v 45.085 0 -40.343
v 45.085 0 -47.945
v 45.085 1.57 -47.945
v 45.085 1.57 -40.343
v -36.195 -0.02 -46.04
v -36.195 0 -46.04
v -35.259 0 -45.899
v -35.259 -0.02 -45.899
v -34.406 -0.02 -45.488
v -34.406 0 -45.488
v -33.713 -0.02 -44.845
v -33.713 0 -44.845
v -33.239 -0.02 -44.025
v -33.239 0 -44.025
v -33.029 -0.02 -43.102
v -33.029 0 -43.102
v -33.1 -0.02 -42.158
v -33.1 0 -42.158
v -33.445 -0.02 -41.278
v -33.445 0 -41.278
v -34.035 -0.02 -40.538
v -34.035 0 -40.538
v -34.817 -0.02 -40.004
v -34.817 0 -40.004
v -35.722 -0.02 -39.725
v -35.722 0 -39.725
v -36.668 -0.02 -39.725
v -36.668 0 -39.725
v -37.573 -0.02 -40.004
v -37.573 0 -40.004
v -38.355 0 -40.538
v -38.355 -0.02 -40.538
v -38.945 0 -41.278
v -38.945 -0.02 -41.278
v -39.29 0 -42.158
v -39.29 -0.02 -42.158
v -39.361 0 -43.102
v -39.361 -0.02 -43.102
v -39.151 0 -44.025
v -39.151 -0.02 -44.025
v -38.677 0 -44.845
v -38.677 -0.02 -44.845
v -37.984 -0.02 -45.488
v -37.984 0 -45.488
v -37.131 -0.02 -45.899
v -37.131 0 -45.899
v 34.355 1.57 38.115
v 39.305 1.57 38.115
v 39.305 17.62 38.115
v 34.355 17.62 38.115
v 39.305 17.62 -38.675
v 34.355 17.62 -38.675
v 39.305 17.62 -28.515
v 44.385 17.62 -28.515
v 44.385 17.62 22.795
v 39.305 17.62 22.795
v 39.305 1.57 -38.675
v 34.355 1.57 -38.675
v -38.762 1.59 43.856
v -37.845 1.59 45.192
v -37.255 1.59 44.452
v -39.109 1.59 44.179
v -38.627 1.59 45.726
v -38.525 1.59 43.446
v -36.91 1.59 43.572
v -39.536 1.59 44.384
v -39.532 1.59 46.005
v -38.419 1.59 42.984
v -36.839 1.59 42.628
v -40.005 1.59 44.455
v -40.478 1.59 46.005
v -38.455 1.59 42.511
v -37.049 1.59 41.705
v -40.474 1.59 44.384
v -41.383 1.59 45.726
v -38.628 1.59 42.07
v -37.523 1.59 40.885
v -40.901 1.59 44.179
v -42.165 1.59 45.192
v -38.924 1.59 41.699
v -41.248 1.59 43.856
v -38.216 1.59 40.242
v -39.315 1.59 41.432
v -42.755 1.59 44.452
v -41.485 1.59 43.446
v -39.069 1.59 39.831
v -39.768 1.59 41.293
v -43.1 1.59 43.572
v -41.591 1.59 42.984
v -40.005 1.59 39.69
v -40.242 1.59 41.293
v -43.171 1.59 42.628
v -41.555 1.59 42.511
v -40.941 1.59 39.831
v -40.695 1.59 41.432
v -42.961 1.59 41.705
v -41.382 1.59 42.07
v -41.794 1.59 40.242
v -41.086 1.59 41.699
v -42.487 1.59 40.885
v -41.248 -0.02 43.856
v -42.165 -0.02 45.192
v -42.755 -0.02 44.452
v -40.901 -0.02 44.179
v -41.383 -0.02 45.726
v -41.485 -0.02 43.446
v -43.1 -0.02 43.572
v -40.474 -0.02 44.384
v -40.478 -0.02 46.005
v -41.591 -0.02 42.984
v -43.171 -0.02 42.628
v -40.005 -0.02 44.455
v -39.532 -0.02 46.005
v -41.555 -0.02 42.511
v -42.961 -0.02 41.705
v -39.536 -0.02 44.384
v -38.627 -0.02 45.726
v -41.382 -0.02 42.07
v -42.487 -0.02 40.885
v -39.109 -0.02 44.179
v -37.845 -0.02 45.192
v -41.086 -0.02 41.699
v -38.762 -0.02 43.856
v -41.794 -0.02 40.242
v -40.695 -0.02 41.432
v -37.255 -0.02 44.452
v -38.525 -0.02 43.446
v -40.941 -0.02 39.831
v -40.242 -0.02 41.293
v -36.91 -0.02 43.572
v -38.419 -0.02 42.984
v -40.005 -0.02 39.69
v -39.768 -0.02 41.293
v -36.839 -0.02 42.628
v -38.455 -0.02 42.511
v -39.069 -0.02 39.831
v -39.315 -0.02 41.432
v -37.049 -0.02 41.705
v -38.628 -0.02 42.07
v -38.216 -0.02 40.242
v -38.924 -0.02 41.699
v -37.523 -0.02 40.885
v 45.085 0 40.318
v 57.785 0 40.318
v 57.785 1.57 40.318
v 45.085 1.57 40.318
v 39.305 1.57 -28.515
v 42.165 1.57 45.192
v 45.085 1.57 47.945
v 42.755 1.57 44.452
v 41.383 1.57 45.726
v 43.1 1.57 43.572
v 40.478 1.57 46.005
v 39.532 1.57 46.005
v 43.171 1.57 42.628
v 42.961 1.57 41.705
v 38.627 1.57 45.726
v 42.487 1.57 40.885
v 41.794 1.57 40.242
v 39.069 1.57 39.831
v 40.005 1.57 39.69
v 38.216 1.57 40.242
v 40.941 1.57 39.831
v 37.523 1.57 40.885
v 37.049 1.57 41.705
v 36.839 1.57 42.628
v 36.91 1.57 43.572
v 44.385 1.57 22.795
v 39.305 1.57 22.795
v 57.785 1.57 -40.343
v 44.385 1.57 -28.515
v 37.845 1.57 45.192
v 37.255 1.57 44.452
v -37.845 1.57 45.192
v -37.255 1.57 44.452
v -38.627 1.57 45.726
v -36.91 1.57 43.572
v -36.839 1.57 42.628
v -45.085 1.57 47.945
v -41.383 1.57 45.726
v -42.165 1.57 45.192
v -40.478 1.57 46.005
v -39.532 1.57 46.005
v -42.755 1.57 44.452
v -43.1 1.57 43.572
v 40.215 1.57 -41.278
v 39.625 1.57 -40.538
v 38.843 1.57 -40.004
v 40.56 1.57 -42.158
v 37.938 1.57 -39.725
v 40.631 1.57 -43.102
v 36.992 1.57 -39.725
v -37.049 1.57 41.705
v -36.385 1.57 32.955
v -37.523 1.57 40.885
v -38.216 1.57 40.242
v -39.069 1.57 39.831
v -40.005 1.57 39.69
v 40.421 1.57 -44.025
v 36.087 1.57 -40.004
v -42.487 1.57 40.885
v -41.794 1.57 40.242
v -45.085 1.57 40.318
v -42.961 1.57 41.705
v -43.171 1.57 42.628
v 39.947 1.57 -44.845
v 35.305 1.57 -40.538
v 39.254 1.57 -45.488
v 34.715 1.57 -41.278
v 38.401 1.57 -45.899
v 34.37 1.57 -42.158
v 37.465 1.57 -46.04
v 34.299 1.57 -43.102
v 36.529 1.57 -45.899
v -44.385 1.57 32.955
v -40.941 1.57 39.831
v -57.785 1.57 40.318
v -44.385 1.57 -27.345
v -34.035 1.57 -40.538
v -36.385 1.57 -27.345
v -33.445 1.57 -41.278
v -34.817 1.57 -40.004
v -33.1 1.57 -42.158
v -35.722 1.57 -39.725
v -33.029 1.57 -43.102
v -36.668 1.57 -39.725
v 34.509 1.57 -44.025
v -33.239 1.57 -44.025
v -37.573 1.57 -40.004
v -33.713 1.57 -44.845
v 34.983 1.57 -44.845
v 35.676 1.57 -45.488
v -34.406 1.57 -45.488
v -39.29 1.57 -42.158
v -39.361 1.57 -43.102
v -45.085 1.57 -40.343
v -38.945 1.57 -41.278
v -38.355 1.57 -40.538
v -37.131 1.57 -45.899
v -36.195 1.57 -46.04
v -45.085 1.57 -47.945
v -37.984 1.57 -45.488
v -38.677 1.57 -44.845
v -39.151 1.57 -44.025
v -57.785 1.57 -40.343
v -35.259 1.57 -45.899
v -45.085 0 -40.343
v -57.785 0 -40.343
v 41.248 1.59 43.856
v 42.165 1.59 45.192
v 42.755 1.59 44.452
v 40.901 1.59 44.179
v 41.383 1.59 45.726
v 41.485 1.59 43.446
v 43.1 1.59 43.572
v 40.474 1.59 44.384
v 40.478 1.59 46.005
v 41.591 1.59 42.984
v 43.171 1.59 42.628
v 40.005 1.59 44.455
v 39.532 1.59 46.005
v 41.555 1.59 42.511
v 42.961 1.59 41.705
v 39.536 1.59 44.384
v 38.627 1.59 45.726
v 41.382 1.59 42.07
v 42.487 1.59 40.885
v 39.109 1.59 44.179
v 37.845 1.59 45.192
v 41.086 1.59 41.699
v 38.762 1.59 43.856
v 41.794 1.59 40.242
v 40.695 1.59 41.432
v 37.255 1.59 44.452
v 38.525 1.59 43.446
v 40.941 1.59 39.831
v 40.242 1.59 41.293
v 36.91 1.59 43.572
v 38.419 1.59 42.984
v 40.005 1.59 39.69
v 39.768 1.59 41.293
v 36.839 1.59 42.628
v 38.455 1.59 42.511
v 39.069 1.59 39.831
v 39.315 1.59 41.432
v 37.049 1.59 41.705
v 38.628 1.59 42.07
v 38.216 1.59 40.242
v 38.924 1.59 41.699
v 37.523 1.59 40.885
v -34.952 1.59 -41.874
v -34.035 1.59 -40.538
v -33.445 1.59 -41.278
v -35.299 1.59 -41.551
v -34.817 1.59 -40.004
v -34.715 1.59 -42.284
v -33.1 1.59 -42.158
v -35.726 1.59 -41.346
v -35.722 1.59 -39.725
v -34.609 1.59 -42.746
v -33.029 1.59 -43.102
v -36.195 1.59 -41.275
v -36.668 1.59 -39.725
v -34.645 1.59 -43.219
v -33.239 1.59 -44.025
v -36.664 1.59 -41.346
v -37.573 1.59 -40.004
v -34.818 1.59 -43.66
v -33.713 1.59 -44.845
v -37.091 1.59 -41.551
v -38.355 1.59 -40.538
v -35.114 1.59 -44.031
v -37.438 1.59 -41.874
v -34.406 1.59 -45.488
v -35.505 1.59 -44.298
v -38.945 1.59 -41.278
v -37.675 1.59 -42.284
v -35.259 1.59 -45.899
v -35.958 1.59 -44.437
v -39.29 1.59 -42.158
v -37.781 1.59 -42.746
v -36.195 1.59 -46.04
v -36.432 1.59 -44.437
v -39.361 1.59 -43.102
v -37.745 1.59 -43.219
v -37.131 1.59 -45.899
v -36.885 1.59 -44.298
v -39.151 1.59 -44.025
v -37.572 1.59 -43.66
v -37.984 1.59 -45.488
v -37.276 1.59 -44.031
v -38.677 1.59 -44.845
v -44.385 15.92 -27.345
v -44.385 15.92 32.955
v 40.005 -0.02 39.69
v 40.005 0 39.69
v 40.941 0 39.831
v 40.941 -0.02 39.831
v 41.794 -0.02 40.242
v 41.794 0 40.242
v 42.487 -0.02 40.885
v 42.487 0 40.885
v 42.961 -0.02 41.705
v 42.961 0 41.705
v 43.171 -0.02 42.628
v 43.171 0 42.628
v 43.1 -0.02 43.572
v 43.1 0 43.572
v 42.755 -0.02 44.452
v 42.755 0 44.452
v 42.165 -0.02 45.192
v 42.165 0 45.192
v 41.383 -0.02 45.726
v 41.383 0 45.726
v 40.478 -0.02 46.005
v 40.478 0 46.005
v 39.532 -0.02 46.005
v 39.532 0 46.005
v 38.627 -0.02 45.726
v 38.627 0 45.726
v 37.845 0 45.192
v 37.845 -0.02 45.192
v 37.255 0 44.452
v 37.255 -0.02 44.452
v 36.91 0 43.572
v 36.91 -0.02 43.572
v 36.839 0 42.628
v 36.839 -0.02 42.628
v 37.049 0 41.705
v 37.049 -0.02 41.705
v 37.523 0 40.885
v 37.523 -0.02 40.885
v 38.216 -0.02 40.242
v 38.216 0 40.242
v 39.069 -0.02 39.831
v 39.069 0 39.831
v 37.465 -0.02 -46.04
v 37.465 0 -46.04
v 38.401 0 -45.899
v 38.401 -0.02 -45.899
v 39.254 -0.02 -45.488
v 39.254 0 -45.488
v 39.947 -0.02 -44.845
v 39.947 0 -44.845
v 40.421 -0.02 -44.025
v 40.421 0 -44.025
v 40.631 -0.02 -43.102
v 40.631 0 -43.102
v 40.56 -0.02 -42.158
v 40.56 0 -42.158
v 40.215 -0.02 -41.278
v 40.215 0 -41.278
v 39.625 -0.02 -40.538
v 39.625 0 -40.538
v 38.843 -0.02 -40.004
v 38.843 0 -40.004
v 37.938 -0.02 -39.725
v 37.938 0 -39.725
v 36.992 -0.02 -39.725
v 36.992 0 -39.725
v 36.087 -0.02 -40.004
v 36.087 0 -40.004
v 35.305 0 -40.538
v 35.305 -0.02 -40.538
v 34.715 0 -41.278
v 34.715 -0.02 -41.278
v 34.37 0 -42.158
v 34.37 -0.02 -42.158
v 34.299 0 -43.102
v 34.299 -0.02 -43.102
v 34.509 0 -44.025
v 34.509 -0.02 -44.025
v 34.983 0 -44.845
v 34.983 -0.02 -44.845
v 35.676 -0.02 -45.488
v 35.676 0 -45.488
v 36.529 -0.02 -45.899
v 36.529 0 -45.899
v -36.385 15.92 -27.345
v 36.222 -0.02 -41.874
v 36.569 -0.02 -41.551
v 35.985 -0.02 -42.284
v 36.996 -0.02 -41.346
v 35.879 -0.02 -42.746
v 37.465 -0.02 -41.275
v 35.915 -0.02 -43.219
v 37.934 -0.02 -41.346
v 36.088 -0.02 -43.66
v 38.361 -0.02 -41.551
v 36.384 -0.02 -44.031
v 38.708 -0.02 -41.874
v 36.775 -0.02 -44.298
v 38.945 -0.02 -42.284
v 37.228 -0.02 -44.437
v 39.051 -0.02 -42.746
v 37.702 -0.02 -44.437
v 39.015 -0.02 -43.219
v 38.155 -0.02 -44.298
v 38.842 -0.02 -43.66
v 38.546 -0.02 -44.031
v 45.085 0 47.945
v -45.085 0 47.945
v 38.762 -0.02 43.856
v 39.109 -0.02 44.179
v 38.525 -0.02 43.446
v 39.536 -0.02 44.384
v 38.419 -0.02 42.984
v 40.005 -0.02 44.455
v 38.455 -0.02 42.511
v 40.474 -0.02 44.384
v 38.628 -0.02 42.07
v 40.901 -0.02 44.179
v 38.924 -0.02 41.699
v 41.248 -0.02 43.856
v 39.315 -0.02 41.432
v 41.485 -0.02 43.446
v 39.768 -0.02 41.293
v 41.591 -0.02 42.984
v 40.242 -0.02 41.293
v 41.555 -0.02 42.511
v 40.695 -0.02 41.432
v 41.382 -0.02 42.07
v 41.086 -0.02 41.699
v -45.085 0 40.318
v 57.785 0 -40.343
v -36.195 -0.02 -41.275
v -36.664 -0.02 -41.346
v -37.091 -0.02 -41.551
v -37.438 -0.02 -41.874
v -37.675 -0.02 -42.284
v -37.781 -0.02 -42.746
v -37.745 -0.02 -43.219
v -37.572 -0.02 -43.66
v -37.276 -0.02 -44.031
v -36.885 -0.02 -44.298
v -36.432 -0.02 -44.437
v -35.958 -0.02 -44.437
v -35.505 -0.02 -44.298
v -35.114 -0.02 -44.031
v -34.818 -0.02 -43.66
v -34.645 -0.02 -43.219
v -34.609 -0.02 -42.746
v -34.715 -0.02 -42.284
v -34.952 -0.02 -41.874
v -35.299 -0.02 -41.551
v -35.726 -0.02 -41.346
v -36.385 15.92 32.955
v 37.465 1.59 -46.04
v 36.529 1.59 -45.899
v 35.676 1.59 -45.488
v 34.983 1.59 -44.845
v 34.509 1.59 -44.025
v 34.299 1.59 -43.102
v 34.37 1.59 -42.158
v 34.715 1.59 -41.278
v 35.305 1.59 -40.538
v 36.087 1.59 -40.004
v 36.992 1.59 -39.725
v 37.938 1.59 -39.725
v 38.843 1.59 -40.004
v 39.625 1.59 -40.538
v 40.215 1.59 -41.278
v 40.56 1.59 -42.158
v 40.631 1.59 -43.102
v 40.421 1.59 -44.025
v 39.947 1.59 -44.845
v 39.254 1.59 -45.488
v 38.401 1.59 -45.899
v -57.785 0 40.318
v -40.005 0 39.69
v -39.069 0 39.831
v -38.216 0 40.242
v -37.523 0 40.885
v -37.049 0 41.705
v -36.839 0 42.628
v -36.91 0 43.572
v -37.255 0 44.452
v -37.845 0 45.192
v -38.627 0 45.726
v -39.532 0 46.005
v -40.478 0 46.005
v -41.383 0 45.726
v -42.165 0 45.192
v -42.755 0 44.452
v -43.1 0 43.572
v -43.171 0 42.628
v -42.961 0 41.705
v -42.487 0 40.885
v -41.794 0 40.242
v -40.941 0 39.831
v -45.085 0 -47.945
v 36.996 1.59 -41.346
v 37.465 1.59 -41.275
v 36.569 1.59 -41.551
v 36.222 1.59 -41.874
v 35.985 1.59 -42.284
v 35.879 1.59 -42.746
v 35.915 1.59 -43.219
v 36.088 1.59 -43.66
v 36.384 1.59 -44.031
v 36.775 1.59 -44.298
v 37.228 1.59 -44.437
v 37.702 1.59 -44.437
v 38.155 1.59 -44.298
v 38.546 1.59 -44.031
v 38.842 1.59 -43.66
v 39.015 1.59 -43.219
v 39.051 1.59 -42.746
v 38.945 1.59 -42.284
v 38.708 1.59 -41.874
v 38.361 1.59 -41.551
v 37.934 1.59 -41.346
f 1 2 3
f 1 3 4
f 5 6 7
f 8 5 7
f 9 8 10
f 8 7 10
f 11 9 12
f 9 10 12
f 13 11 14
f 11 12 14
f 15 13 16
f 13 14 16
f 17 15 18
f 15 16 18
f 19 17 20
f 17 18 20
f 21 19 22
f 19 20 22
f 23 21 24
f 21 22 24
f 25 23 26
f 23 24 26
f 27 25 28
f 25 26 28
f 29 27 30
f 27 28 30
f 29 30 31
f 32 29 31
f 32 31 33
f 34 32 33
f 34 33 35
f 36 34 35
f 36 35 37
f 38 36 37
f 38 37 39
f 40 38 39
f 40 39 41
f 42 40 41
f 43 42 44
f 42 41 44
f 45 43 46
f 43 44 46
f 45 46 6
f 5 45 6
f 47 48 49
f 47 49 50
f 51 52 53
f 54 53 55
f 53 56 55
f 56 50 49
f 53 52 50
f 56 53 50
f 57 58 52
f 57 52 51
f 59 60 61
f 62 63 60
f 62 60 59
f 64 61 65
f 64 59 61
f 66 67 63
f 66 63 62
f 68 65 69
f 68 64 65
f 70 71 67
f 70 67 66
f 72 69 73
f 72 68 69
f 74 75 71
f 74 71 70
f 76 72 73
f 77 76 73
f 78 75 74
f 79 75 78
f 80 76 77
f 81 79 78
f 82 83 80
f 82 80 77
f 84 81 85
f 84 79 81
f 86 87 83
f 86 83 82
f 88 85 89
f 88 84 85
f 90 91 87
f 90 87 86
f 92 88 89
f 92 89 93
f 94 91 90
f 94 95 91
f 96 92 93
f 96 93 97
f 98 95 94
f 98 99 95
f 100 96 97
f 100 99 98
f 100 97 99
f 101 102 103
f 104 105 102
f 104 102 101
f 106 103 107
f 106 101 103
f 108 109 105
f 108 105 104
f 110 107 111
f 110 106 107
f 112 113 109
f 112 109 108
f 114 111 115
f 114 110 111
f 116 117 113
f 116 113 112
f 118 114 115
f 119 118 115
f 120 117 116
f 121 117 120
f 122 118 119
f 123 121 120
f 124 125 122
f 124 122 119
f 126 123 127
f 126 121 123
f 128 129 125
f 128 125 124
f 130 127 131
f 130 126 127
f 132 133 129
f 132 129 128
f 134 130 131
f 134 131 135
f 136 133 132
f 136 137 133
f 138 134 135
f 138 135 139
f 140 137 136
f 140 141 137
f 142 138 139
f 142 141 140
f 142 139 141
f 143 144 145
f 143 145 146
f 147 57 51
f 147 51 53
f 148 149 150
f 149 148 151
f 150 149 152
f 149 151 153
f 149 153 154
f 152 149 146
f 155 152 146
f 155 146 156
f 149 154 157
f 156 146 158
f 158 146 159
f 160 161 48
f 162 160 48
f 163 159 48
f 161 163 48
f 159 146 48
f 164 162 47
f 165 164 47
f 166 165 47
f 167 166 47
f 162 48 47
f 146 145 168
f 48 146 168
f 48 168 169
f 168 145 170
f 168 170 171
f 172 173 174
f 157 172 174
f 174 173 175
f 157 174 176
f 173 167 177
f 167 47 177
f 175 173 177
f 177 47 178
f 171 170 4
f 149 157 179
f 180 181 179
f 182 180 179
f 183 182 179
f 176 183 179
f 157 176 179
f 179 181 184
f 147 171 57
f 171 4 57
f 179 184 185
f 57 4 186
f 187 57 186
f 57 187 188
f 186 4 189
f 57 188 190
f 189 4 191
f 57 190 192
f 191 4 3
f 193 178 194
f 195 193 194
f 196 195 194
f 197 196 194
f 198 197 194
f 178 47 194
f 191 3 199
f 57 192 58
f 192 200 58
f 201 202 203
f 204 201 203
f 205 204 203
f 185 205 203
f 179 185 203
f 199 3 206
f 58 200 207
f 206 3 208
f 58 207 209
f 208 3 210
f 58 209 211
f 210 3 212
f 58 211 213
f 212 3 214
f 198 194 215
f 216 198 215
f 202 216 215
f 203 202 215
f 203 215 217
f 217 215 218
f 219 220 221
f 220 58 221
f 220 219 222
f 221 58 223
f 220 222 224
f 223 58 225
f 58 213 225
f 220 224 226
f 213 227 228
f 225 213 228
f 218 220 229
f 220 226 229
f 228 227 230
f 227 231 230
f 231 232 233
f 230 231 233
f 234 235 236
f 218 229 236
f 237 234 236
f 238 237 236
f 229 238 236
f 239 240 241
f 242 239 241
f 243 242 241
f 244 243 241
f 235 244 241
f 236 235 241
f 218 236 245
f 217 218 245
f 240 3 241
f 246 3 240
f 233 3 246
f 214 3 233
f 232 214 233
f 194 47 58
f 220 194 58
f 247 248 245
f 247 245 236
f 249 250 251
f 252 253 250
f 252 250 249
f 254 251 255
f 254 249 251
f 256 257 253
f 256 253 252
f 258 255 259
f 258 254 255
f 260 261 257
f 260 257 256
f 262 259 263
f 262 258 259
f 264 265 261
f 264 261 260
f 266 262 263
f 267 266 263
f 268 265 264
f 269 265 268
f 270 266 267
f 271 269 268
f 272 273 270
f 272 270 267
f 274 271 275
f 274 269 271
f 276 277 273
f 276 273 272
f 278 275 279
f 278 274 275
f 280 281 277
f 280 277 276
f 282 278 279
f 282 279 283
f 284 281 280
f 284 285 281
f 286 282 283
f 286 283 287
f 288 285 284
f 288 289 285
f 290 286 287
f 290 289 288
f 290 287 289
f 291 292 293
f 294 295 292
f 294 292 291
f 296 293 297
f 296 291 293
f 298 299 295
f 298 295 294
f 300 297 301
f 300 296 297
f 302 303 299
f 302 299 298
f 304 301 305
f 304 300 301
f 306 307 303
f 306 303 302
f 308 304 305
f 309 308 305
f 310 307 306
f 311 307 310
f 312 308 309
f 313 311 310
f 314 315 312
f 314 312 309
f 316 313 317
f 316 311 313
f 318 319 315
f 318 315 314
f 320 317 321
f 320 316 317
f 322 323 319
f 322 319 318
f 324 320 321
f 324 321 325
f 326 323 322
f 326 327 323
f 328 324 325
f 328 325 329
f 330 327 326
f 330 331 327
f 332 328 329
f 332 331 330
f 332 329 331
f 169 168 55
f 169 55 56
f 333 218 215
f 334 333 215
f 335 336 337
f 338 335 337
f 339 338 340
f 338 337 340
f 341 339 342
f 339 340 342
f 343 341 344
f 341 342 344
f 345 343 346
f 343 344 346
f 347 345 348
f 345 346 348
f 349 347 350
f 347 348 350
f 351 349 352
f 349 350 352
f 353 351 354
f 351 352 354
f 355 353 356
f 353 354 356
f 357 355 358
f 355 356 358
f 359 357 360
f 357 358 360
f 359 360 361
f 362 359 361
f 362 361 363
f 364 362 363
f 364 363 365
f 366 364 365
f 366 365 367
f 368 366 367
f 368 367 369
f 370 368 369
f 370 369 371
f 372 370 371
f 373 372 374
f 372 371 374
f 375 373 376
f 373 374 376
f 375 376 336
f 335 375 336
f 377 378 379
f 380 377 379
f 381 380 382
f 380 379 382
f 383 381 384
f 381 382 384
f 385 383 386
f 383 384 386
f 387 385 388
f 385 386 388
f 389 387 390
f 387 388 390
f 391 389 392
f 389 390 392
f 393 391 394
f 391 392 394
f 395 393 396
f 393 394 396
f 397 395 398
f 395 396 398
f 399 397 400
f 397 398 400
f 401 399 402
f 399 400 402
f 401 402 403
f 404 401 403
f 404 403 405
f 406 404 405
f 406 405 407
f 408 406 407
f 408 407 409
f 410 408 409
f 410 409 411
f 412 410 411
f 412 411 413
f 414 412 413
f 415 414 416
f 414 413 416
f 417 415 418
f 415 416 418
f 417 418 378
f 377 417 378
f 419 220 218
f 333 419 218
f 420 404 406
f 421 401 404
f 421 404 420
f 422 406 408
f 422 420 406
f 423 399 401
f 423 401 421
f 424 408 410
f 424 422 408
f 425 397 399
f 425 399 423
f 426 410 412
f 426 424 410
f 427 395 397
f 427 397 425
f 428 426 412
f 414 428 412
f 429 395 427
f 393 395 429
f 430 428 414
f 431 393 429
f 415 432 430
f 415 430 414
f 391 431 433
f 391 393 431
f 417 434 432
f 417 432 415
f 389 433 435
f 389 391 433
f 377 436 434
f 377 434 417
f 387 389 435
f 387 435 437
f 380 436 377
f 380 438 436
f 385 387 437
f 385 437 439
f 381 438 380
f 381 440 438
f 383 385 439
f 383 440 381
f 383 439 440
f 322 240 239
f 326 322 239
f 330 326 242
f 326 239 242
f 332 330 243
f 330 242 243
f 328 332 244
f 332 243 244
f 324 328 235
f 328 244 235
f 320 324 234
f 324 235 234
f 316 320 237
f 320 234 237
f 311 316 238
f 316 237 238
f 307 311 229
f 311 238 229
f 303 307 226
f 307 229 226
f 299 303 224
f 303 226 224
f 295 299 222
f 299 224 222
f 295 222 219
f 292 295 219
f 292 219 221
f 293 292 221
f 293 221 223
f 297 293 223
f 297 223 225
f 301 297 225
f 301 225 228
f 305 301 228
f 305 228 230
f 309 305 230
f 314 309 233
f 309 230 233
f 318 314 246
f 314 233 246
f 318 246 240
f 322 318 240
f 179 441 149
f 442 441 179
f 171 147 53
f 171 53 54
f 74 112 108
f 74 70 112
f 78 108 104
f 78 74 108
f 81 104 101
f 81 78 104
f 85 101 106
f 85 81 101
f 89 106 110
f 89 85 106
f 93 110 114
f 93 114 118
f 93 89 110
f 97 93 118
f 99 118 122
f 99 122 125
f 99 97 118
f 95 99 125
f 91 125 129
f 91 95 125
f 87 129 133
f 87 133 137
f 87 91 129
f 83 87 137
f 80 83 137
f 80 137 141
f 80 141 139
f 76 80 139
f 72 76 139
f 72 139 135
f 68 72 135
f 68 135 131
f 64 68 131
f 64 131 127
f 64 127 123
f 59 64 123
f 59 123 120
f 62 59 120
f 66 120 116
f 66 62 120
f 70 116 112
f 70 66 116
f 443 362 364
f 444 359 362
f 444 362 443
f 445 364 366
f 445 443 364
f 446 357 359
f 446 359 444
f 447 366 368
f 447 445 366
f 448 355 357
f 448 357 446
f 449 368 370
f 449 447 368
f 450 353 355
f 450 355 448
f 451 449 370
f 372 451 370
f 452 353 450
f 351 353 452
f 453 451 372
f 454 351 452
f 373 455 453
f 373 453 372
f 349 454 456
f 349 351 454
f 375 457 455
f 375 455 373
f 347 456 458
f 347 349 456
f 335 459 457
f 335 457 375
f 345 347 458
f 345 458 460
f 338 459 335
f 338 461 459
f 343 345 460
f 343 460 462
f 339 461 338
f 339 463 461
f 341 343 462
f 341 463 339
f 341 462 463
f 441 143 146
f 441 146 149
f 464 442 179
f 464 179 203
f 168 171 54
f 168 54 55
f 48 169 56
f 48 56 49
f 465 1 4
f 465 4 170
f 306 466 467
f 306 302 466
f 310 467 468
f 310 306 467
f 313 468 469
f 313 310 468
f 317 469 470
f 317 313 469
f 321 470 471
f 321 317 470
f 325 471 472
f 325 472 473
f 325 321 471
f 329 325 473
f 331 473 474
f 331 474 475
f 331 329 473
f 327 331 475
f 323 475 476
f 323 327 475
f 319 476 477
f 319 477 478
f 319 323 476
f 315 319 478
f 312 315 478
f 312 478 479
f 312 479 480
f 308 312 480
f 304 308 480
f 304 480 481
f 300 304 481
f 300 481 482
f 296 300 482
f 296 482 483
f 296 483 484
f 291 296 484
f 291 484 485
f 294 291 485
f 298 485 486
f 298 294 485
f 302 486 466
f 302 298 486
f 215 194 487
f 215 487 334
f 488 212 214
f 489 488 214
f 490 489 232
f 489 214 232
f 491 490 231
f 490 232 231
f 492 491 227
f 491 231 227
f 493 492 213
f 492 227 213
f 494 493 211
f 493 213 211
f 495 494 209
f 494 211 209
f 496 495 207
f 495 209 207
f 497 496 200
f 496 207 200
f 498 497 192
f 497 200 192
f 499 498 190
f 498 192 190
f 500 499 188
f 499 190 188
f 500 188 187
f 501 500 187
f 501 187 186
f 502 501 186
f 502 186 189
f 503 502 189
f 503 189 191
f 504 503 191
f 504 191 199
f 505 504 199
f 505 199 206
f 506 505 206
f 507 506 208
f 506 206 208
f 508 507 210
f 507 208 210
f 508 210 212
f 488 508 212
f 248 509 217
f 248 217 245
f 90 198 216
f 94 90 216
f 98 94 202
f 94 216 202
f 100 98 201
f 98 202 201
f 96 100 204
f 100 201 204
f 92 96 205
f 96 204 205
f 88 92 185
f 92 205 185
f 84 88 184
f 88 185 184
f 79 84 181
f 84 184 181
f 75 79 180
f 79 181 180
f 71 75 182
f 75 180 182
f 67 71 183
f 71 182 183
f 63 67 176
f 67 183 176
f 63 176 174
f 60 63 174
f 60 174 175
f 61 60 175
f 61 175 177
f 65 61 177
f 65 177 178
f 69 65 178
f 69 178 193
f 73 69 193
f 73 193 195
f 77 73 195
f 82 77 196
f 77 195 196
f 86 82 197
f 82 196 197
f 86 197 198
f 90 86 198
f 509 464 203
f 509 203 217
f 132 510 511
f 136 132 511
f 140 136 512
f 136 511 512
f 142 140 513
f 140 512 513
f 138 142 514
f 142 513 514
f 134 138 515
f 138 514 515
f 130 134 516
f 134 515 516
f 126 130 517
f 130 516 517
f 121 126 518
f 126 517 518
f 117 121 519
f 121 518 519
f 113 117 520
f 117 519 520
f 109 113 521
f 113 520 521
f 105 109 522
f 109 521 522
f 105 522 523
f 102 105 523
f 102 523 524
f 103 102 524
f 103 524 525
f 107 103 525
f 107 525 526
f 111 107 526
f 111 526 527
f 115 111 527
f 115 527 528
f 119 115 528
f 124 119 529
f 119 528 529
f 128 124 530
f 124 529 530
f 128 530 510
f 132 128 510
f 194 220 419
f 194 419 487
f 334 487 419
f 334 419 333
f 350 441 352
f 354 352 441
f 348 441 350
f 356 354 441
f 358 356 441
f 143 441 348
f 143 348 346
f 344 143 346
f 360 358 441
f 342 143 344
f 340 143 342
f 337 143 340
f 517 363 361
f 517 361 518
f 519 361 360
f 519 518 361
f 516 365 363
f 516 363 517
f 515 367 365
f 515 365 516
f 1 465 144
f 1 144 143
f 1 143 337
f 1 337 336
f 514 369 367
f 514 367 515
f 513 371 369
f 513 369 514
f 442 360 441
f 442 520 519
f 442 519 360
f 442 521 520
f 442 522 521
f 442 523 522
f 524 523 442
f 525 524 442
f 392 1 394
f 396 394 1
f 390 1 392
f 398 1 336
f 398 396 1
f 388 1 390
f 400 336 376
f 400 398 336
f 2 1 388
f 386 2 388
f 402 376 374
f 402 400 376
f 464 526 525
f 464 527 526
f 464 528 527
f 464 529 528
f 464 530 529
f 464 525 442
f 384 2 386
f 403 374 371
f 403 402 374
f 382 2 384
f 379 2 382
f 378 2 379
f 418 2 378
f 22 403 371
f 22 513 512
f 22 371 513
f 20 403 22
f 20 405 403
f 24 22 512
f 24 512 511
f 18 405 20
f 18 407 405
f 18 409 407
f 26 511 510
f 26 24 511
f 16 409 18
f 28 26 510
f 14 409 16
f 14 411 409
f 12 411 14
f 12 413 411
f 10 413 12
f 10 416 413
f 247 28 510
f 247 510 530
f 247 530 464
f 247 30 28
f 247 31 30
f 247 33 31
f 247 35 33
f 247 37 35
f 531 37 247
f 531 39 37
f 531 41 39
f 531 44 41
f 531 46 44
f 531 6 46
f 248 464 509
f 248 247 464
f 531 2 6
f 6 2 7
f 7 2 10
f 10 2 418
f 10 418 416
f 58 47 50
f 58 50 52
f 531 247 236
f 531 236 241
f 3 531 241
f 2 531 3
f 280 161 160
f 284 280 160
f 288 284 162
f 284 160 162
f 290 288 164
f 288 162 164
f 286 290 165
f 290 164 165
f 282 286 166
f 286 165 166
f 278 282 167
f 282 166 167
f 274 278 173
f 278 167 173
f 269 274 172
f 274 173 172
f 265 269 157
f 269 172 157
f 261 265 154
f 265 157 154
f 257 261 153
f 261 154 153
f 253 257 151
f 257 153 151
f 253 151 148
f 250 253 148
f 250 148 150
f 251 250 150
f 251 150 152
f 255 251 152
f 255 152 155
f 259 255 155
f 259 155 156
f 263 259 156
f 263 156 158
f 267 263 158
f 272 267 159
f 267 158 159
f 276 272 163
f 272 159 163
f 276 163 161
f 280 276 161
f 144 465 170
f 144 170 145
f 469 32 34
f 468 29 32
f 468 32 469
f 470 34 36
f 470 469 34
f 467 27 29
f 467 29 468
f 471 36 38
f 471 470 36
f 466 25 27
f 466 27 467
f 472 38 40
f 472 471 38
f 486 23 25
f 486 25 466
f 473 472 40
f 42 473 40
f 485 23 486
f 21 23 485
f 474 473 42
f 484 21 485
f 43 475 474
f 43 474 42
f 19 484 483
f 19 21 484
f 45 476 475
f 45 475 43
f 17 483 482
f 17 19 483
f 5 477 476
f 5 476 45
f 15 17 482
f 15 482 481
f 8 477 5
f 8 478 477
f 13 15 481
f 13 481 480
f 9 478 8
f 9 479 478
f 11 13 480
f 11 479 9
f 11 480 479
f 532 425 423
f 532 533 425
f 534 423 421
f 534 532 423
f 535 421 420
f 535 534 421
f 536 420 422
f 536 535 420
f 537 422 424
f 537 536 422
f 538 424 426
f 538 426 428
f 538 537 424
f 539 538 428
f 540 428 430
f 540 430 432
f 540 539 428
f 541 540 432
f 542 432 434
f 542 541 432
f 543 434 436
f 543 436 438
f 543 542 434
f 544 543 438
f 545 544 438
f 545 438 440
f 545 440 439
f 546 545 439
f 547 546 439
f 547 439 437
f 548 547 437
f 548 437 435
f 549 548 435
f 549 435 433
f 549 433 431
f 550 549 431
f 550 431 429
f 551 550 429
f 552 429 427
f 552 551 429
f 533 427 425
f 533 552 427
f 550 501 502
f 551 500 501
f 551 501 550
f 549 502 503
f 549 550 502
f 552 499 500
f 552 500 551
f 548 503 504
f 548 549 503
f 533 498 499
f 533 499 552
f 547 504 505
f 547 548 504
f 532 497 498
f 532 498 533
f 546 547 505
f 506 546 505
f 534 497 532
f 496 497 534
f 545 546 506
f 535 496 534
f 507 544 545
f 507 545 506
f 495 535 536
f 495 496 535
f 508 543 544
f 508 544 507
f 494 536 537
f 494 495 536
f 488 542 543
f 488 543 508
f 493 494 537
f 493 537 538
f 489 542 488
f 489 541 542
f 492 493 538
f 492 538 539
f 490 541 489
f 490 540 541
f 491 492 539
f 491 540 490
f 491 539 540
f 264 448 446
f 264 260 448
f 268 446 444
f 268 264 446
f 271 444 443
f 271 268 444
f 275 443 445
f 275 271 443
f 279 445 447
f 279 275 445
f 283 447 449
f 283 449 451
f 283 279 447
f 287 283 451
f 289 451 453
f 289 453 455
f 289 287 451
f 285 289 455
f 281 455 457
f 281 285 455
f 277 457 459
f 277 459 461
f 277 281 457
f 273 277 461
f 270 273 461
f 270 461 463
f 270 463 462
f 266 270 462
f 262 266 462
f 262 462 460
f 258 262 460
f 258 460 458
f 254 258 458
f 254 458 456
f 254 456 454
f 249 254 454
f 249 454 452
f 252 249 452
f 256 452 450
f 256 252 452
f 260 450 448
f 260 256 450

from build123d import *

# Parameters (mm, degrees)
BASE_EXTRUDE_DEPTH   = 1.57
SKETCH2_R            = 1.59
MOUNTING_HOLES_DEPTH = 76.101891787
SKETCH3_R            = 3.175
SKETCH3_R_2          = 1.59
TOP_PADS_DEPTH       = 0.02
SKETCH4_R            = 3.175
SKETCH4_R_2          = 1.59
BOTT_PADS_DEPTH      = 0.02
ISA_CNCT_DEPTH       = 16.05
SKETCH6_W            = 8
SKETCH6_H            = 60.3
PCI_CNCT_DEPTH       = 14.35


with BuildPart() as part:
    # Sketch1 → Base-Extrude (new body)
    with BuildSketch(Plane(origin=(0, 0, 0), x_dir=(1, 0, 0), z_dir=(0, 1, 0))):
        Polygon((-45.085, 47.945), (45.085, 47.945), (45.085, 40.343374485), (57.785, 40.343374485), (57.785, -40.318146652), (45.085, -40.318146652), (45.085, -47.945), (-45.085, -47.945), (-45.085, -40.318146652), (-57.785, -40.318146652), (-57.785, 40.343374485), (-45.085, 40.343374485), align=None)
    extrude(amount=BASE_EXTRUDE_DEPTH)

    # Sketch2 → Mounting Holes (cut, through all)
    with BuildSketch(Plane(origin=(0, 1.57, 0), x_dir=(-1, 0, 0), z_dir=(0, 1, 0))):
        with Locations(Location((36.195, -42.865, 0), (0, 0, 90))):
            Circle(SKETCH2_R)
        with Locations(Location((40.005, 42.865, 0), (0, 0, 90))):
            Circle(SKETCH2_R)
        with Locations(Location((-40.005, 42.865, 0), (0, 0, 90))):
            Circle(SKETCH2_R)
        with Locations(Location((-37.465, -42.865, 0), (0, 0, 90))):
            Circle(SKETCH2_R)
    extrude(amount=-MOUNTING_HOLES_DEPTH, mode=Mode.SUBTRACT)

    # Sketch3 → Top Pads (add)
    with BuildSketch(Plane(origin=(0, 1.57, 0), x_dir=(-1, 0, 0), z_dir=(0, 1, 0))):
        with Locations(Location((36.195, -42.865, 0), (0, 0, 270))):
            Circle(SKETCH3_R)
        with Locations(Location((36.195, -42.865, 0), (0, 0, 90))):
            Circle(SKETCH3_R_2, mode=Mode.SUBTRACT)
        with Locations(Location((-37.465, -42.865, 0), (0, 0, 270))):
            Circle(SKETCH3_R)
        with Locations(Location((-37.465, -42.865, 0), (0, 0, 90))):
            Circle(SKETCH3_R_2, mode=Mode.SUBTRACT)
        with Locations(Location((-40.005, 42.865, 0), (0, 0, 270))):
            Circle(SKETCH3_R)
        with Locations(Location((-40.005, 42.865, 0), (0, 0, 90))):
            Circle(SKETCH3_R_2, mode=Mode.SUBTRACT)
        with Locations(Location((40.005, 42.865, 0), (0, 0, 270))):
            Circle(SKETCH3_R)
        with Locations(Location((40.005, 42.865, 0), (0, 0, 90))):
            Circle(SKETCH3_R_2, mode=Mode.SUBTRACT)
    extrude(amount=TOP_PADS_DEPTH)

    # Sketch4 → Bott Pads (add)
    with BuildSketch(Plane.XZ):
        with Locations(Location((-36.195, -42.865, 0), (0, 0, 270))):
            Circle(SKETCH4_R)
        with Locations(Location((-36.195, -42.865, 0), (0, 0, 90))):
            Circle(SKETCH4_R_2, mode=Mode.SUBTRACT)
        with Locations(Location((37.465, -42.865, 0), (0, 0, 270))):
            Circle(SKETCH4_R)
        with Locations(Location((37.465, -42.865, 0), (0, 0, 90))):
            Circle(SKETCH4_R_2, mode=Mode.SUBTRACT)
        with Locations(Location((40.005, 42.865, 0), (0, 0, 270))):
            Circle(SKETCH4_R)
        with Locations(Location((40.005, 42.865, 0), (0, 0, 90))):
            Circle(SKETCH4_R_2, mode=Mode.SUBTRACT)
        with Locations(Location((-40.005, 42.865, 0), (0, 0, 270))):
            Circle(SKETCH4_R)
        with Locations(Location((-40.005, 42.865, 0), (0, 0, 90))):
            Circle(SKETCH4_R_2, mode=Mode.SUBTRACT)
    extrude(amount=BOTT_PADS_DEPTH)

    # Sketch5 → ISA Cnct (add)
    with BuildSketch(Plane(origin=(0, 1.57, 0), x_dir=(-1, 0, 0), z_dir=(0, 1, 0))):
        Polygon((-39.305, 22.795), (-39.305, 38.115), (-34.355, 38.115), (-34.355, -38.675), (-39.305, -38.675), (-39.305, -28.515), (-44.385, -28.515), (-44.385, 22.795), align=None)
    extrude(amount=ISA_CNCT_DEPTH)

    # Sketch6 → PCI Cnct (add)
    with BuildSketch(Plane(origin=(0, 1.57, 0), x_dir=(-1, 0, 0), z_dir=(0, 1, 0))):
        with Locations((40.385, 2.805)):
            Rectangle(SKETCH6_W, SKETCH6_H)
    extrude(amount=PCI_CNCT_DEPTH)


solid = part.part
